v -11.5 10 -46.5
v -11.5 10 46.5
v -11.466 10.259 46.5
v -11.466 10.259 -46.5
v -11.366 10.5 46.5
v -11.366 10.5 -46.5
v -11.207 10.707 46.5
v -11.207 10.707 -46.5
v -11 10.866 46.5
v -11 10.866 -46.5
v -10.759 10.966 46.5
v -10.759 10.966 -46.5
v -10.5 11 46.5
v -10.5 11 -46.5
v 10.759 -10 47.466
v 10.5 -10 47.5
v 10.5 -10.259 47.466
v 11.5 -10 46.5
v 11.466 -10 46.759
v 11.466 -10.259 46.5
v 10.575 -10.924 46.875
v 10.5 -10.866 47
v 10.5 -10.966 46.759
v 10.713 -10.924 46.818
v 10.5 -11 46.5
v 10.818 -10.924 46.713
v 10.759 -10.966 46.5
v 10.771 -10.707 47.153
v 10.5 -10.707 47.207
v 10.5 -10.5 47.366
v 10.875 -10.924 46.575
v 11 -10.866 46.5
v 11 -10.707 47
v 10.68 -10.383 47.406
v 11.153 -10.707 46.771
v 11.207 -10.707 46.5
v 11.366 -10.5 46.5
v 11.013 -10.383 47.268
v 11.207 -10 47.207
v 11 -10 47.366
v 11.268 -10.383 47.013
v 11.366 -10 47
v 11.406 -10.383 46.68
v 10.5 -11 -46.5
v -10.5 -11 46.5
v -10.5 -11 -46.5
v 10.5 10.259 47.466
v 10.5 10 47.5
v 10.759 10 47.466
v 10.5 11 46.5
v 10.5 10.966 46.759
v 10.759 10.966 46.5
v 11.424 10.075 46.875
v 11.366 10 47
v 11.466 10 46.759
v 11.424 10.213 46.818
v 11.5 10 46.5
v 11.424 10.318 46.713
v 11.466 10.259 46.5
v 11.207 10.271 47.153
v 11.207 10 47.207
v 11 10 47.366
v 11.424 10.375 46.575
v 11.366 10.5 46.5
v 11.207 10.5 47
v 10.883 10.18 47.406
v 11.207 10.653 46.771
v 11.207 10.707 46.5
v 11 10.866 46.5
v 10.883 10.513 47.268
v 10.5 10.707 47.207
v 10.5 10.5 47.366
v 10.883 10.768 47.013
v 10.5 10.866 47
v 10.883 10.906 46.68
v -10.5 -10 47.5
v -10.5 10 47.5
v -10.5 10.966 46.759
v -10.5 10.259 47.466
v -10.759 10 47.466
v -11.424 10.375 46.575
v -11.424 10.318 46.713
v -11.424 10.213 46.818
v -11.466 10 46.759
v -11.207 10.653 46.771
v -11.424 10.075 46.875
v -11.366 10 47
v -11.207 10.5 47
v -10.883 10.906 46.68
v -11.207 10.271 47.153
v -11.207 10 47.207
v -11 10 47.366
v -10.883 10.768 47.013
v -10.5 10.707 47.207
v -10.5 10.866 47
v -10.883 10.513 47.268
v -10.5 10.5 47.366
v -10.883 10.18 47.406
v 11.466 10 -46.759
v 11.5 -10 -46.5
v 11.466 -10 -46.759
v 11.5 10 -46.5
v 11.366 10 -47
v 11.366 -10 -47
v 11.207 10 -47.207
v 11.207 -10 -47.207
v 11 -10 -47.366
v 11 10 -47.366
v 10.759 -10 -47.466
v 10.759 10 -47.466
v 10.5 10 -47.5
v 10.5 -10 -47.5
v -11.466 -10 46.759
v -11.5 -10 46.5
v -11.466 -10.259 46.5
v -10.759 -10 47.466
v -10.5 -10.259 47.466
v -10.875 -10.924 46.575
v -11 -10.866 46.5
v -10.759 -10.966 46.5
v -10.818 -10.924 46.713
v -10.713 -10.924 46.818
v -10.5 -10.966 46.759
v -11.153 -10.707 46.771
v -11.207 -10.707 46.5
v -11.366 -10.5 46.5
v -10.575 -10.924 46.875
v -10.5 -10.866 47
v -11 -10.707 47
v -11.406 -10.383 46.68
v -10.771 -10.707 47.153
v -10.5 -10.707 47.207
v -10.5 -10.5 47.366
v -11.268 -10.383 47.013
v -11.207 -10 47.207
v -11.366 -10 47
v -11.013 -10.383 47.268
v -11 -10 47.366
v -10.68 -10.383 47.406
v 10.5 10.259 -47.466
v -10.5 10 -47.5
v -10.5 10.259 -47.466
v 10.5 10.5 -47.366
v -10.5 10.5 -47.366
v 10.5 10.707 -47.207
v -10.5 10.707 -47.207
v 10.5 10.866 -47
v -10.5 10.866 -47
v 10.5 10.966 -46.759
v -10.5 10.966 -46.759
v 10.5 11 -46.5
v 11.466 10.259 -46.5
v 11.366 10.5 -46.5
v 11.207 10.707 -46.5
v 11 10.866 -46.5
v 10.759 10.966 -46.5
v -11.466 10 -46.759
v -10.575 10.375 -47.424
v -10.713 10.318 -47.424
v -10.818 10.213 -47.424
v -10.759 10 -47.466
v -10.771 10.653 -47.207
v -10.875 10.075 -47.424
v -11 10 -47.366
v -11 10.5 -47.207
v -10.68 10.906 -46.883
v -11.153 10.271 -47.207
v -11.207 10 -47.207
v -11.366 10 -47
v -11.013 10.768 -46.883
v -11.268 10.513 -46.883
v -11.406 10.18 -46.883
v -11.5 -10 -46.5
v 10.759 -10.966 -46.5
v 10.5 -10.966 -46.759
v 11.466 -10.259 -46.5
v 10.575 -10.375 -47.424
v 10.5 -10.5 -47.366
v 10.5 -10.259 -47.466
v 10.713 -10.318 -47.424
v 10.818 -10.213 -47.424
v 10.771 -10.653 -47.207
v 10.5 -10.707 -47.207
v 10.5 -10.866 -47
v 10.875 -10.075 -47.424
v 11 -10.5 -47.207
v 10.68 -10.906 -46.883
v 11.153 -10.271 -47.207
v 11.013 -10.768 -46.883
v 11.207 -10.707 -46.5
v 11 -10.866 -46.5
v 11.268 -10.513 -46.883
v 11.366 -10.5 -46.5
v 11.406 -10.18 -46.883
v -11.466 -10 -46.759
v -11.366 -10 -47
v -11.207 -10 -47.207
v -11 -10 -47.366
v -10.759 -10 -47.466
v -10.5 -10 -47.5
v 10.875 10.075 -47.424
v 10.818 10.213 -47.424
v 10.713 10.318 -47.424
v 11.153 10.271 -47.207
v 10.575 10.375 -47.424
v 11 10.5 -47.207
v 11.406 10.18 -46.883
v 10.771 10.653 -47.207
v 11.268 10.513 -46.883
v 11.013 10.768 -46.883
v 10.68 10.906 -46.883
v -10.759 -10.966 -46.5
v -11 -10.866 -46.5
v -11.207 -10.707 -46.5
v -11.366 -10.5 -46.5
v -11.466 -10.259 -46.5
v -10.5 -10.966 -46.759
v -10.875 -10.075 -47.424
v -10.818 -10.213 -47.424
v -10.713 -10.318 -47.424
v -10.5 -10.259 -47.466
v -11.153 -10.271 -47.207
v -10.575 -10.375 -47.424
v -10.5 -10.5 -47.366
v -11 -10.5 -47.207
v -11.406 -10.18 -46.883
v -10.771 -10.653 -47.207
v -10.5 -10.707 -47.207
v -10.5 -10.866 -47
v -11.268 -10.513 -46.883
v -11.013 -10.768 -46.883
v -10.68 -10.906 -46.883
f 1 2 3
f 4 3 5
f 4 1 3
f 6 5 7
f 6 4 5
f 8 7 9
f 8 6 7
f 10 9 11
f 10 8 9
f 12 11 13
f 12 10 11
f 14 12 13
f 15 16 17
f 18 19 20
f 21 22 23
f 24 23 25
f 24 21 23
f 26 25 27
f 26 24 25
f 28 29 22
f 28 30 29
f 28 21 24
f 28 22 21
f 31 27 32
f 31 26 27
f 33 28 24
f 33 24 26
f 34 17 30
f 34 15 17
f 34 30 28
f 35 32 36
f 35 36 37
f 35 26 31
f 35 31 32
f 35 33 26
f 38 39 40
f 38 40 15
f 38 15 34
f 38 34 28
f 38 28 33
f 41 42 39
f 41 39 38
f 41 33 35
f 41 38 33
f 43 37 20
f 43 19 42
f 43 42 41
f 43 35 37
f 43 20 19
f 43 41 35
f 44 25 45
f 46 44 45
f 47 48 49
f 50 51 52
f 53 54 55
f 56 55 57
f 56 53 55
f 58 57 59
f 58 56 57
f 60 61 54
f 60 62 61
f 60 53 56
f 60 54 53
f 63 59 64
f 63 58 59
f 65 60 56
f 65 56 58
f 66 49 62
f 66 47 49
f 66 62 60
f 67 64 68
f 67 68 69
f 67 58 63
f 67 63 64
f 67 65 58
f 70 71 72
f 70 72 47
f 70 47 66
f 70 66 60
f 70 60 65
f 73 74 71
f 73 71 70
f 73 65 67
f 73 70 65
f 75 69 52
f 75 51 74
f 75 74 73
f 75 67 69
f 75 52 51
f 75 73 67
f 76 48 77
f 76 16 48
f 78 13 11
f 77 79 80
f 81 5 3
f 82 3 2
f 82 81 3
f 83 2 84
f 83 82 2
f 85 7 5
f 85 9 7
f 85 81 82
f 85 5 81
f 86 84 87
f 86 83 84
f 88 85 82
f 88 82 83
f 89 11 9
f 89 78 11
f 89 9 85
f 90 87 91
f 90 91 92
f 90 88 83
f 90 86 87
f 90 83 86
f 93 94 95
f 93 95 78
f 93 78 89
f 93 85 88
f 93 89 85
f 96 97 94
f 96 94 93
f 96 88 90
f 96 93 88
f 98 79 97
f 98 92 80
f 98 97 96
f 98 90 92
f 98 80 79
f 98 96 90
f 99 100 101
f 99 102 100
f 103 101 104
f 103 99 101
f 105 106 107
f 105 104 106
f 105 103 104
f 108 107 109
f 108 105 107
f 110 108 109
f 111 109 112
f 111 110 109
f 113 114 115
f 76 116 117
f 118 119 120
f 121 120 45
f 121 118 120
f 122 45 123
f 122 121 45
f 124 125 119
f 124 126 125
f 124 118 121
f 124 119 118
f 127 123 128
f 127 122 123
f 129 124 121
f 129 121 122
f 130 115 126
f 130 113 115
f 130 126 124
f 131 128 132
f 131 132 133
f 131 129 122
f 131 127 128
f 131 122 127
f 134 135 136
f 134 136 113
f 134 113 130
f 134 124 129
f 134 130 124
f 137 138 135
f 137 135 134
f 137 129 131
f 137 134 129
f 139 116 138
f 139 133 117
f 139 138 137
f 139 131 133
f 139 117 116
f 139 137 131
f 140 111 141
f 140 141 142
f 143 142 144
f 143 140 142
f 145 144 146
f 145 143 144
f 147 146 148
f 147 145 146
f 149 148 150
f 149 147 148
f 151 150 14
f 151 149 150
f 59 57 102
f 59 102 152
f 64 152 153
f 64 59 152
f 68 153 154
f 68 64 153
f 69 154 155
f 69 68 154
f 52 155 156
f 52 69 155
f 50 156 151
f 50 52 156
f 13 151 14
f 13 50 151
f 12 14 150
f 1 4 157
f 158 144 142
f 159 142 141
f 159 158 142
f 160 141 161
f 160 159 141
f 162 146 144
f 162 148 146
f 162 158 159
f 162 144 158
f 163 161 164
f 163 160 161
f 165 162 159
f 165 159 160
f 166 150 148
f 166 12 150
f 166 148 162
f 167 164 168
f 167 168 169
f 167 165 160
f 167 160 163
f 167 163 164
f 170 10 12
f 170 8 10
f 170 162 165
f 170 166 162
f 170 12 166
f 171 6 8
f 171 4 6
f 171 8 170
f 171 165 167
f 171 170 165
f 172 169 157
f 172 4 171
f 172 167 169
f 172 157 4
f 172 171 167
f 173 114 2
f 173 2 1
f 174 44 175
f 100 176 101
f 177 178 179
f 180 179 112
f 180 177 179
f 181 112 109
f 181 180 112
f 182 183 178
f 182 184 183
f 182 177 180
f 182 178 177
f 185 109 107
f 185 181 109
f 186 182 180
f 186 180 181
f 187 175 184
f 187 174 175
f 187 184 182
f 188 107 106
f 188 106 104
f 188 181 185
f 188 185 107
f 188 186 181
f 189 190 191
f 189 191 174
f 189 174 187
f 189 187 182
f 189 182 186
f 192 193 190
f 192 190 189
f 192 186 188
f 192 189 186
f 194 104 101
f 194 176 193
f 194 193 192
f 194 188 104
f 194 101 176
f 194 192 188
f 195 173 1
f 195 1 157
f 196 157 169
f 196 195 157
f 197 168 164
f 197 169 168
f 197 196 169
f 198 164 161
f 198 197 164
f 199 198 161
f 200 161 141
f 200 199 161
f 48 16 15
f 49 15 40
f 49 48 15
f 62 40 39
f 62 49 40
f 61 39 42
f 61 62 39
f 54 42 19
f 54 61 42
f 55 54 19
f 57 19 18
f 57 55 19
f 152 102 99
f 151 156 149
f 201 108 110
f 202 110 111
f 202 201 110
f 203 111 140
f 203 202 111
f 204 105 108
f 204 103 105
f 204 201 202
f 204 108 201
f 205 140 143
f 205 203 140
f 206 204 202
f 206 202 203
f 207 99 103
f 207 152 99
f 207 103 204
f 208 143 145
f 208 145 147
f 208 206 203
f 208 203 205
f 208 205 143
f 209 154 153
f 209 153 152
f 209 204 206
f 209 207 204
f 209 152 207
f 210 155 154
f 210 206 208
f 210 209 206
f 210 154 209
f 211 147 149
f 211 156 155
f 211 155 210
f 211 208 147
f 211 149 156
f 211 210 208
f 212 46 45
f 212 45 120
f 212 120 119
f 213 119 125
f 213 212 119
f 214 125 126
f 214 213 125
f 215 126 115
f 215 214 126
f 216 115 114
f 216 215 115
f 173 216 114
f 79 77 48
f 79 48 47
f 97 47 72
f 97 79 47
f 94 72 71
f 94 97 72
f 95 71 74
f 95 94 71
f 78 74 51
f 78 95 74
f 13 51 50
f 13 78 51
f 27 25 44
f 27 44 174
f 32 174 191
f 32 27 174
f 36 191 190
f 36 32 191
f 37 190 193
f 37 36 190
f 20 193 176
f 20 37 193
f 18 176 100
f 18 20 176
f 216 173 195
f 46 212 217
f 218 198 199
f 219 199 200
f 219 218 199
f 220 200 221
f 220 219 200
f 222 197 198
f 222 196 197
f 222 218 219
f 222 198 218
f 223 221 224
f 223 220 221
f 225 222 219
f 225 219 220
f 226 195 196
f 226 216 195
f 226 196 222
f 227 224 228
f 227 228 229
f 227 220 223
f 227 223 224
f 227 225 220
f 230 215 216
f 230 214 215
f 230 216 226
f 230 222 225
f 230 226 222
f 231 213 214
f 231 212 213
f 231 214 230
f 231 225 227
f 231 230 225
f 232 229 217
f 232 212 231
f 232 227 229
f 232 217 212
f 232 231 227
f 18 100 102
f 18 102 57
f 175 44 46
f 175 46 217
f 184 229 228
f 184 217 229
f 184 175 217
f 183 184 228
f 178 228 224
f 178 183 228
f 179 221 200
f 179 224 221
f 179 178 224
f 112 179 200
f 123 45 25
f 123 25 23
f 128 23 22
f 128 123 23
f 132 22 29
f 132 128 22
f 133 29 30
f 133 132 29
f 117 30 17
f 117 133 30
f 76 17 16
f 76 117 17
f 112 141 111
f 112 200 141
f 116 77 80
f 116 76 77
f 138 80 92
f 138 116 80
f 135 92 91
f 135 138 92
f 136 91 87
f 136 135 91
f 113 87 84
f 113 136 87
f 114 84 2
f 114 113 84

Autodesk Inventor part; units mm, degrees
ref_plane "YZ Plane" through (0, 0, 0) normal (1, 0, 0) x (0, 1, 0)
ref_plane "XZ Plane" through (0, 0, 0) normal (0, 1, 0) x (-1, 0, 0)
ref_plane "XY Plane" through (0, 0, 0) normal (0, 0, 1) x (1, 0, 0)
sketch "Sketch1" plane through (0, 0, 0) normal (0, 1, 0) x (-1, 0, 0)
  line L0 (-11.5, 47.5) -> (11.5, 47.5)
  line L1 (11.5, 47.5) -> (11.5, -47.5)
  line L2 (11.5, -47.5) -> (-11.5, -47.5)
  line L3 (-11.5, -47.5) -> (-11.5, 47.5)
  line L4 (-11.5, 47.5) -> (11.5, -47.5) construction
  line L5 (11.5, 47.5) -> (-11.5, -47.5) construction
  point P0 (0, 0)
  dimension "d0" = 95
  dimension "d1" = 23
extrude "Extrusion1" add sketch "Sketch1" along normal mid plane 22
fillet "Fillet1" radius 1 12 edges at (0, 11, 47.5) (11.5, 11, 0) (11.5, 0, 47.5) (-11.5, 0, 47.5) (11.5, -11, 0) (0, -11, 47.5) (-11.5, 11, 0) (-11.5, -11, 0) (0, 11, -47.5) (-11.5, 0, -47.5) (11.5, 0, -47.5) (0, -11, -47.5)
properties part number "Battery_Small"
